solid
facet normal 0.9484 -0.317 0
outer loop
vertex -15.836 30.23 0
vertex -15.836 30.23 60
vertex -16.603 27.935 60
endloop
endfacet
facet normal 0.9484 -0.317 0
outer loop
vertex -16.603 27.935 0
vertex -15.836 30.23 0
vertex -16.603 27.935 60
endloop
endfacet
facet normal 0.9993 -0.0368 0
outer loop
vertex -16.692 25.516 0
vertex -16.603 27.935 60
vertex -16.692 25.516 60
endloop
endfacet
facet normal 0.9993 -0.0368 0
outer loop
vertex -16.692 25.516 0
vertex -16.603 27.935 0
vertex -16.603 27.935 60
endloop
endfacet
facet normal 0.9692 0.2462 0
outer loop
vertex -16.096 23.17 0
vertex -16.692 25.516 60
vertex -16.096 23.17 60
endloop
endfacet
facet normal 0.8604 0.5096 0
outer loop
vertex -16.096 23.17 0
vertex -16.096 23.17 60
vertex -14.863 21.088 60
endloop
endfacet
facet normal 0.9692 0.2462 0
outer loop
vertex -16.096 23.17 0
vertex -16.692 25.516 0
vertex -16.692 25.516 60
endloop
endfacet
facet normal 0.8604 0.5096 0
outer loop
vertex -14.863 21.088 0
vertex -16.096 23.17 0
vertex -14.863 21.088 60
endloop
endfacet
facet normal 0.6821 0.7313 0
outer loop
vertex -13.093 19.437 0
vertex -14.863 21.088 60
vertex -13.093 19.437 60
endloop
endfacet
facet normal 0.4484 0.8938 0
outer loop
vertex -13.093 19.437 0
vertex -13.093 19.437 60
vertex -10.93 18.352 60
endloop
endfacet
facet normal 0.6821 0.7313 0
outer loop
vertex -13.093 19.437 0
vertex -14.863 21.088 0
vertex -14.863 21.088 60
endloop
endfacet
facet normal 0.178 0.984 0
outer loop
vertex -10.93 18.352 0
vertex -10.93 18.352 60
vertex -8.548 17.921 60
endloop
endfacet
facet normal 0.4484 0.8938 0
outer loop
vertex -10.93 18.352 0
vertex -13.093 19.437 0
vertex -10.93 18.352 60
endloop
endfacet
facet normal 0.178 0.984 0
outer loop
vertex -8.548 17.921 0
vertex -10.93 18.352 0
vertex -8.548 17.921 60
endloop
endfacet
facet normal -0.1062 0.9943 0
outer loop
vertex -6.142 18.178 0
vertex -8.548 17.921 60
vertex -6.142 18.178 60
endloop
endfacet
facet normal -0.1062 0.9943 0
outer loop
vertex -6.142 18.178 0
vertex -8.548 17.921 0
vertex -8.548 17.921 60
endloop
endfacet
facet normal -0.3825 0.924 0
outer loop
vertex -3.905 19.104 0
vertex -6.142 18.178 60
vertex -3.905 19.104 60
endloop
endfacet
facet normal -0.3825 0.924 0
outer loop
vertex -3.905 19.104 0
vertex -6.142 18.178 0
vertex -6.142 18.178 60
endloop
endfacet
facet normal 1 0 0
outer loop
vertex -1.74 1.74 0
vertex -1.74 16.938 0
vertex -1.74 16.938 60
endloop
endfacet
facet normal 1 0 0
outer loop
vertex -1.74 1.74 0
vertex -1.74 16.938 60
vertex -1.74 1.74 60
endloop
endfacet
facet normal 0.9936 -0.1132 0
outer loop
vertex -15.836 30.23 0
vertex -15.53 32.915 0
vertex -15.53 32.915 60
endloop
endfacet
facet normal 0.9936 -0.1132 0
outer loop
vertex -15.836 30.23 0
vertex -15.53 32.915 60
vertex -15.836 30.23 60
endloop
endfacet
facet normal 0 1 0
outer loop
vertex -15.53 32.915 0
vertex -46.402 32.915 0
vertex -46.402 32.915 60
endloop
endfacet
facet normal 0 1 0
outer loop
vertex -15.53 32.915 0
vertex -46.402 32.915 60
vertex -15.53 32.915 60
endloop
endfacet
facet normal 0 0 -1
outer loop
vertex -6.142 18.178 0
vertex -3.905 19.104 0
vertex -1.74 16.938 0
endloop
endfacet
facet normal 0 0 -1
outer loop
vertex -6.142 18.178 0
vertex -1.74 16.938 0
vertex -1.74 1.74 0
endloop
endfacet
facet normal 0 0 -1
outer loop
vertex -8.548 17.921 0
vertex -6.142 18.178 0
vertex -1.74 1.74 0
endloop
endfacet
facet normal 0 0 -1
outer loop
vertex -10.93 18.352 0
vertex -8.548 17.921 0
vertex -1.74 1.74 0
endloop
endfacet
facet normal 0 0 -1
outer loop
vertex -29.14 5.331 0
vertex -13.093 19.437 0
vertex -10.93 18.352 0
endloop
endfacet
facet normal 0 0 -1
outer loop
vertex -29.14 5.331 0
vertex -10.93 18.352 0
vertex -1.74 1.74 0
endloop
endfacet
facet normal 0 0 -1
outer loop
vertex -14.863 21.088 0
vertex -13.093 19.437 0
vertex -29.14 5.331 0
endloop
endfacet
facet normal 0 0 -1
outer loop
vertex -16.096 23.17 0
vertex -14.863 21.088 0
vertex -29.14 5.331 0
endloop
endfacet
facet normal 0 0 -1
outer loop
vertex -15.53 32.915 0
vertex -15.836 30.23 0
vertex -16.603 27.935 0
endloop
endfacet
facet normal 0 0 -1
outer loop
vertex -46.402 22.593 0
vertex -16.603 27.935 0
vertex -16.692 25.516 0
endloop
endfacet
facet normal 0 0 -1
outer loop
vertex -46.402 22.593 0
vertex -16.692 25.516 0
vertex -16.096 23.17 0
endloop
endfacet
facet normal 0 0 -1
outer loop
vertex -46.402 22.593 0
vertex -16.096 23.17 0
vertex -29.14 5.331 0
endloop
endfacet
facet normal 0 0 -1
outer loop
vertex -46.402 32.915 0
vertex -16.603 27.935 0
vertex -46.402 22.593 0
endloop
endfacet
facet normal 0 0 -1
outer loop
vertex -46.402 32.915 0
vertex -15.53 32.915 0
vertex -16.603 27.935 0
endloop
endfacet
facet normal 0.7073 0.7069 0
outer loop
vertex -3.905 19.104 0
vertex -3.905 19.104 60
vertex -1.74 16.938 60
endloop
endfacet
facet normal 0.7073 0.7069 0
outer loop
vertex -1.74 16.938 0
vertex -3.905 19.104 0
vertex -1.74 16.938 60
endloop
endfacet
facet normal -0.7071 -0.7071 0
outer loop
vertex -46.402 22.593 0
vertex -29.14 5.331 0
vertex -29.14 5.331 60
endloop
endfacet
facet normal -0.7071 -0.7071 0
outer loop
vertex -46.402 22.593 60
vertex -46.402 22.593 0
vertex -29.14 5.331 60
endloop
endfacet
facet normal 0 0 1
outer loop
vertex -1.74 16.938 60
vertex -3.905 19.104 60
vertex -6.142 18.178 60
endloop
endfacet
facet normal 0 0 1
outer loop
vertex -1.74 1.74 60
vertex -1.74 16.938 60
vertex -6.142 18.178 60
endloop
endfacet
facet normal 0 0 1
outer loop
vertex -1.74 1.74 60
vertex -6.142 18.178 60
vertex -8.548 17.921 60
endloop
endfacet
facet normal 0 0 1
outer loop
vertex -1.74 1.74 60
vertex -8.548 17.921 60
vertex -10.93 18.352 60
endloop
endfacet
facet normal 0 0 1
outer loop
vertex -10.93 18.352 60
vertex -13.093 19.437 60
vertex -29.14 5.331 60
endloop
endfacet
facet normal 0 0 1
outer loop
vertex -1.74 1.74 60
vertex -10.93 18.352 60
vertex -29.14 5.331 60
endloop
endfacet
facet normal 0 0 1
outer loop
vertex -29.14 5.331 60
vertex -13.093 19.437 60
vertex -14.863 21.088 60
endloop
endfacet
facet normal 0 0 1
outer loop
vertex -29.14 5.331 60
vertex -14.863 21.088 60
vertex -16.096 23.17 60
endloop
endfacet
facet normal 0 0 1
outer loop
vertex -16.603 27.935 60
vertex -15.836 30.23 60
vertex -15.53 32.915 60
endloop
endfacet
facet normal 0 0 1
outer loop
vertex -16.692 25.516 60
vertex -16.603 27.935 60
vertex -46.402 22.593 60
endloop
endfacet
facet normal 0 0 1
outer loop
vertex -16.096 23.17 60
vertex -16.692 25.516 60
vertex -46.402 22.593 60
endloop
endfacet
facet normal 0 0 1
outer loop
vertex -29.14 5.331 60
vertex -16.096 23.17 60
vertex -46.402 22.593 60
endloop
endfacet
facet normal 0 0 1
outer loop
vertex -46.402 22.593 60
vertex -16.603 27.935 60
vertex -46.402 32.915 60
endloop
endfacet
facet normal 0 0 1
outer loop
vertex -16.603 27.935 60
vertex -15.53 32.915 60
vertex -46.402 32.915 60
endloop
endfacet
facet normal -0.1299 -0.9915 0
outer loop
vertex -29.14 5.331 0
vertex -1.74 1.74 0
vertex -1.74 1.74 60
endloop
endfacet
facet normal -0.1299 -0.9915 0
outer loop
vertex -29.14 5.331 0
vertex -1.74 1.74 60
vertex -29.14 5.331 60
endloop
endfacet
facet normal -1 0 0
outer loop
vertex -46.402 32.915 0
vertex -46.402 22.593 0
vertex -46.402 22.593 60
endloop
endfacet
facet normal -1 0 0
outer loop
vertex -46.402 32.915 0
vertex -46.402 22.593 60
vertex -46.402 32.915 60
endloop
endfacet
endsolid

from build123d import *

# Parameters (mm, degrees)
BOSS_EXTRU_1_DEPTH = 60
CHANFREIN1_START   = -1
CHANFREIN1_DEPTH   = 62
CHANFREIN2_SIZE    = 15
CHANFREIN2_SIZE2   = 17.409920551


with BuildPart() as part:
    # Esquisse1 → Boss.-Extru.1 (new body)
    with BuildSketch(Plane.XY):
        with BuildLine():
            Line((-1.739730228, 1.739730228), (-46.4022226, 7.592964471))
            Line((-46.4022226, 7.592964471), (-46.4022226, 32.915406071))
            Line((-46.4022226, 32.915406071), (-13.716955803, 32.915406071))
            ThreePointArc((-13.716955803, 32.915406071), (-14.250137868, 20.404998431), (-1.739730228, 20.938180496))
            Line((-1.739730228, 20.938180496), (-1.739730228, 1.739730228))
        make_face()
    extrude(amount=BOSS_EXTRU_1_DEPTH)

    # Chanfrein1: read off the stored shape, not the designer's step
    # Chanfrein1 outline → Chanfrein1 (cut)
    with BuildSketch(Plane.XY.offset(CHANFREIN1_START)):
        with BuildLine():
            ThreePointArc((-1.739730228, 20.938180496), (-2.7453552, 19.929895832), (-3.905196789, 19.103647058))
            Line((-3.905196789, 19.103647058), (-1.739730228, 16.938180496))
            Line((-1.739730228, 16.938180496), (-1.739730228, 20.938180496))
        make_face()
        with BuildLine():
            Line((-15.530475388, 32.915406071), (-15.835720777, 30.229973881))
            ThreePointArc((-15.835720777, 30.229973881), (-14.912820327, 31.680372218), (-13.716955803, 32.915406071))
            Line((-13.716955803, 32.915406071), (-15.530475388, 32.915406071))
        make_face()
    extrude(amount=CHANFREIN1_DEPTH, mode=Mode.SUBTRACT)

    # Chanfrein2
    chanfrein2_edges = [part.edges().sort_by_distance(p)[0] for p in [
        (-46.4022226, 7.592964471, 30),
    ]]
    chanfrein2_side = [part.faces().sort_by_distance(p)[0] for p in [
        (-46.4022226, 20.254185271, 30),
    ]]
    chamfer(chanfrein2_edges, length=CHANFREIN2_SIZE, length2=CHANFREIN2_SIZE2, reference=chanfrein2_side[0])


solid = part.part
